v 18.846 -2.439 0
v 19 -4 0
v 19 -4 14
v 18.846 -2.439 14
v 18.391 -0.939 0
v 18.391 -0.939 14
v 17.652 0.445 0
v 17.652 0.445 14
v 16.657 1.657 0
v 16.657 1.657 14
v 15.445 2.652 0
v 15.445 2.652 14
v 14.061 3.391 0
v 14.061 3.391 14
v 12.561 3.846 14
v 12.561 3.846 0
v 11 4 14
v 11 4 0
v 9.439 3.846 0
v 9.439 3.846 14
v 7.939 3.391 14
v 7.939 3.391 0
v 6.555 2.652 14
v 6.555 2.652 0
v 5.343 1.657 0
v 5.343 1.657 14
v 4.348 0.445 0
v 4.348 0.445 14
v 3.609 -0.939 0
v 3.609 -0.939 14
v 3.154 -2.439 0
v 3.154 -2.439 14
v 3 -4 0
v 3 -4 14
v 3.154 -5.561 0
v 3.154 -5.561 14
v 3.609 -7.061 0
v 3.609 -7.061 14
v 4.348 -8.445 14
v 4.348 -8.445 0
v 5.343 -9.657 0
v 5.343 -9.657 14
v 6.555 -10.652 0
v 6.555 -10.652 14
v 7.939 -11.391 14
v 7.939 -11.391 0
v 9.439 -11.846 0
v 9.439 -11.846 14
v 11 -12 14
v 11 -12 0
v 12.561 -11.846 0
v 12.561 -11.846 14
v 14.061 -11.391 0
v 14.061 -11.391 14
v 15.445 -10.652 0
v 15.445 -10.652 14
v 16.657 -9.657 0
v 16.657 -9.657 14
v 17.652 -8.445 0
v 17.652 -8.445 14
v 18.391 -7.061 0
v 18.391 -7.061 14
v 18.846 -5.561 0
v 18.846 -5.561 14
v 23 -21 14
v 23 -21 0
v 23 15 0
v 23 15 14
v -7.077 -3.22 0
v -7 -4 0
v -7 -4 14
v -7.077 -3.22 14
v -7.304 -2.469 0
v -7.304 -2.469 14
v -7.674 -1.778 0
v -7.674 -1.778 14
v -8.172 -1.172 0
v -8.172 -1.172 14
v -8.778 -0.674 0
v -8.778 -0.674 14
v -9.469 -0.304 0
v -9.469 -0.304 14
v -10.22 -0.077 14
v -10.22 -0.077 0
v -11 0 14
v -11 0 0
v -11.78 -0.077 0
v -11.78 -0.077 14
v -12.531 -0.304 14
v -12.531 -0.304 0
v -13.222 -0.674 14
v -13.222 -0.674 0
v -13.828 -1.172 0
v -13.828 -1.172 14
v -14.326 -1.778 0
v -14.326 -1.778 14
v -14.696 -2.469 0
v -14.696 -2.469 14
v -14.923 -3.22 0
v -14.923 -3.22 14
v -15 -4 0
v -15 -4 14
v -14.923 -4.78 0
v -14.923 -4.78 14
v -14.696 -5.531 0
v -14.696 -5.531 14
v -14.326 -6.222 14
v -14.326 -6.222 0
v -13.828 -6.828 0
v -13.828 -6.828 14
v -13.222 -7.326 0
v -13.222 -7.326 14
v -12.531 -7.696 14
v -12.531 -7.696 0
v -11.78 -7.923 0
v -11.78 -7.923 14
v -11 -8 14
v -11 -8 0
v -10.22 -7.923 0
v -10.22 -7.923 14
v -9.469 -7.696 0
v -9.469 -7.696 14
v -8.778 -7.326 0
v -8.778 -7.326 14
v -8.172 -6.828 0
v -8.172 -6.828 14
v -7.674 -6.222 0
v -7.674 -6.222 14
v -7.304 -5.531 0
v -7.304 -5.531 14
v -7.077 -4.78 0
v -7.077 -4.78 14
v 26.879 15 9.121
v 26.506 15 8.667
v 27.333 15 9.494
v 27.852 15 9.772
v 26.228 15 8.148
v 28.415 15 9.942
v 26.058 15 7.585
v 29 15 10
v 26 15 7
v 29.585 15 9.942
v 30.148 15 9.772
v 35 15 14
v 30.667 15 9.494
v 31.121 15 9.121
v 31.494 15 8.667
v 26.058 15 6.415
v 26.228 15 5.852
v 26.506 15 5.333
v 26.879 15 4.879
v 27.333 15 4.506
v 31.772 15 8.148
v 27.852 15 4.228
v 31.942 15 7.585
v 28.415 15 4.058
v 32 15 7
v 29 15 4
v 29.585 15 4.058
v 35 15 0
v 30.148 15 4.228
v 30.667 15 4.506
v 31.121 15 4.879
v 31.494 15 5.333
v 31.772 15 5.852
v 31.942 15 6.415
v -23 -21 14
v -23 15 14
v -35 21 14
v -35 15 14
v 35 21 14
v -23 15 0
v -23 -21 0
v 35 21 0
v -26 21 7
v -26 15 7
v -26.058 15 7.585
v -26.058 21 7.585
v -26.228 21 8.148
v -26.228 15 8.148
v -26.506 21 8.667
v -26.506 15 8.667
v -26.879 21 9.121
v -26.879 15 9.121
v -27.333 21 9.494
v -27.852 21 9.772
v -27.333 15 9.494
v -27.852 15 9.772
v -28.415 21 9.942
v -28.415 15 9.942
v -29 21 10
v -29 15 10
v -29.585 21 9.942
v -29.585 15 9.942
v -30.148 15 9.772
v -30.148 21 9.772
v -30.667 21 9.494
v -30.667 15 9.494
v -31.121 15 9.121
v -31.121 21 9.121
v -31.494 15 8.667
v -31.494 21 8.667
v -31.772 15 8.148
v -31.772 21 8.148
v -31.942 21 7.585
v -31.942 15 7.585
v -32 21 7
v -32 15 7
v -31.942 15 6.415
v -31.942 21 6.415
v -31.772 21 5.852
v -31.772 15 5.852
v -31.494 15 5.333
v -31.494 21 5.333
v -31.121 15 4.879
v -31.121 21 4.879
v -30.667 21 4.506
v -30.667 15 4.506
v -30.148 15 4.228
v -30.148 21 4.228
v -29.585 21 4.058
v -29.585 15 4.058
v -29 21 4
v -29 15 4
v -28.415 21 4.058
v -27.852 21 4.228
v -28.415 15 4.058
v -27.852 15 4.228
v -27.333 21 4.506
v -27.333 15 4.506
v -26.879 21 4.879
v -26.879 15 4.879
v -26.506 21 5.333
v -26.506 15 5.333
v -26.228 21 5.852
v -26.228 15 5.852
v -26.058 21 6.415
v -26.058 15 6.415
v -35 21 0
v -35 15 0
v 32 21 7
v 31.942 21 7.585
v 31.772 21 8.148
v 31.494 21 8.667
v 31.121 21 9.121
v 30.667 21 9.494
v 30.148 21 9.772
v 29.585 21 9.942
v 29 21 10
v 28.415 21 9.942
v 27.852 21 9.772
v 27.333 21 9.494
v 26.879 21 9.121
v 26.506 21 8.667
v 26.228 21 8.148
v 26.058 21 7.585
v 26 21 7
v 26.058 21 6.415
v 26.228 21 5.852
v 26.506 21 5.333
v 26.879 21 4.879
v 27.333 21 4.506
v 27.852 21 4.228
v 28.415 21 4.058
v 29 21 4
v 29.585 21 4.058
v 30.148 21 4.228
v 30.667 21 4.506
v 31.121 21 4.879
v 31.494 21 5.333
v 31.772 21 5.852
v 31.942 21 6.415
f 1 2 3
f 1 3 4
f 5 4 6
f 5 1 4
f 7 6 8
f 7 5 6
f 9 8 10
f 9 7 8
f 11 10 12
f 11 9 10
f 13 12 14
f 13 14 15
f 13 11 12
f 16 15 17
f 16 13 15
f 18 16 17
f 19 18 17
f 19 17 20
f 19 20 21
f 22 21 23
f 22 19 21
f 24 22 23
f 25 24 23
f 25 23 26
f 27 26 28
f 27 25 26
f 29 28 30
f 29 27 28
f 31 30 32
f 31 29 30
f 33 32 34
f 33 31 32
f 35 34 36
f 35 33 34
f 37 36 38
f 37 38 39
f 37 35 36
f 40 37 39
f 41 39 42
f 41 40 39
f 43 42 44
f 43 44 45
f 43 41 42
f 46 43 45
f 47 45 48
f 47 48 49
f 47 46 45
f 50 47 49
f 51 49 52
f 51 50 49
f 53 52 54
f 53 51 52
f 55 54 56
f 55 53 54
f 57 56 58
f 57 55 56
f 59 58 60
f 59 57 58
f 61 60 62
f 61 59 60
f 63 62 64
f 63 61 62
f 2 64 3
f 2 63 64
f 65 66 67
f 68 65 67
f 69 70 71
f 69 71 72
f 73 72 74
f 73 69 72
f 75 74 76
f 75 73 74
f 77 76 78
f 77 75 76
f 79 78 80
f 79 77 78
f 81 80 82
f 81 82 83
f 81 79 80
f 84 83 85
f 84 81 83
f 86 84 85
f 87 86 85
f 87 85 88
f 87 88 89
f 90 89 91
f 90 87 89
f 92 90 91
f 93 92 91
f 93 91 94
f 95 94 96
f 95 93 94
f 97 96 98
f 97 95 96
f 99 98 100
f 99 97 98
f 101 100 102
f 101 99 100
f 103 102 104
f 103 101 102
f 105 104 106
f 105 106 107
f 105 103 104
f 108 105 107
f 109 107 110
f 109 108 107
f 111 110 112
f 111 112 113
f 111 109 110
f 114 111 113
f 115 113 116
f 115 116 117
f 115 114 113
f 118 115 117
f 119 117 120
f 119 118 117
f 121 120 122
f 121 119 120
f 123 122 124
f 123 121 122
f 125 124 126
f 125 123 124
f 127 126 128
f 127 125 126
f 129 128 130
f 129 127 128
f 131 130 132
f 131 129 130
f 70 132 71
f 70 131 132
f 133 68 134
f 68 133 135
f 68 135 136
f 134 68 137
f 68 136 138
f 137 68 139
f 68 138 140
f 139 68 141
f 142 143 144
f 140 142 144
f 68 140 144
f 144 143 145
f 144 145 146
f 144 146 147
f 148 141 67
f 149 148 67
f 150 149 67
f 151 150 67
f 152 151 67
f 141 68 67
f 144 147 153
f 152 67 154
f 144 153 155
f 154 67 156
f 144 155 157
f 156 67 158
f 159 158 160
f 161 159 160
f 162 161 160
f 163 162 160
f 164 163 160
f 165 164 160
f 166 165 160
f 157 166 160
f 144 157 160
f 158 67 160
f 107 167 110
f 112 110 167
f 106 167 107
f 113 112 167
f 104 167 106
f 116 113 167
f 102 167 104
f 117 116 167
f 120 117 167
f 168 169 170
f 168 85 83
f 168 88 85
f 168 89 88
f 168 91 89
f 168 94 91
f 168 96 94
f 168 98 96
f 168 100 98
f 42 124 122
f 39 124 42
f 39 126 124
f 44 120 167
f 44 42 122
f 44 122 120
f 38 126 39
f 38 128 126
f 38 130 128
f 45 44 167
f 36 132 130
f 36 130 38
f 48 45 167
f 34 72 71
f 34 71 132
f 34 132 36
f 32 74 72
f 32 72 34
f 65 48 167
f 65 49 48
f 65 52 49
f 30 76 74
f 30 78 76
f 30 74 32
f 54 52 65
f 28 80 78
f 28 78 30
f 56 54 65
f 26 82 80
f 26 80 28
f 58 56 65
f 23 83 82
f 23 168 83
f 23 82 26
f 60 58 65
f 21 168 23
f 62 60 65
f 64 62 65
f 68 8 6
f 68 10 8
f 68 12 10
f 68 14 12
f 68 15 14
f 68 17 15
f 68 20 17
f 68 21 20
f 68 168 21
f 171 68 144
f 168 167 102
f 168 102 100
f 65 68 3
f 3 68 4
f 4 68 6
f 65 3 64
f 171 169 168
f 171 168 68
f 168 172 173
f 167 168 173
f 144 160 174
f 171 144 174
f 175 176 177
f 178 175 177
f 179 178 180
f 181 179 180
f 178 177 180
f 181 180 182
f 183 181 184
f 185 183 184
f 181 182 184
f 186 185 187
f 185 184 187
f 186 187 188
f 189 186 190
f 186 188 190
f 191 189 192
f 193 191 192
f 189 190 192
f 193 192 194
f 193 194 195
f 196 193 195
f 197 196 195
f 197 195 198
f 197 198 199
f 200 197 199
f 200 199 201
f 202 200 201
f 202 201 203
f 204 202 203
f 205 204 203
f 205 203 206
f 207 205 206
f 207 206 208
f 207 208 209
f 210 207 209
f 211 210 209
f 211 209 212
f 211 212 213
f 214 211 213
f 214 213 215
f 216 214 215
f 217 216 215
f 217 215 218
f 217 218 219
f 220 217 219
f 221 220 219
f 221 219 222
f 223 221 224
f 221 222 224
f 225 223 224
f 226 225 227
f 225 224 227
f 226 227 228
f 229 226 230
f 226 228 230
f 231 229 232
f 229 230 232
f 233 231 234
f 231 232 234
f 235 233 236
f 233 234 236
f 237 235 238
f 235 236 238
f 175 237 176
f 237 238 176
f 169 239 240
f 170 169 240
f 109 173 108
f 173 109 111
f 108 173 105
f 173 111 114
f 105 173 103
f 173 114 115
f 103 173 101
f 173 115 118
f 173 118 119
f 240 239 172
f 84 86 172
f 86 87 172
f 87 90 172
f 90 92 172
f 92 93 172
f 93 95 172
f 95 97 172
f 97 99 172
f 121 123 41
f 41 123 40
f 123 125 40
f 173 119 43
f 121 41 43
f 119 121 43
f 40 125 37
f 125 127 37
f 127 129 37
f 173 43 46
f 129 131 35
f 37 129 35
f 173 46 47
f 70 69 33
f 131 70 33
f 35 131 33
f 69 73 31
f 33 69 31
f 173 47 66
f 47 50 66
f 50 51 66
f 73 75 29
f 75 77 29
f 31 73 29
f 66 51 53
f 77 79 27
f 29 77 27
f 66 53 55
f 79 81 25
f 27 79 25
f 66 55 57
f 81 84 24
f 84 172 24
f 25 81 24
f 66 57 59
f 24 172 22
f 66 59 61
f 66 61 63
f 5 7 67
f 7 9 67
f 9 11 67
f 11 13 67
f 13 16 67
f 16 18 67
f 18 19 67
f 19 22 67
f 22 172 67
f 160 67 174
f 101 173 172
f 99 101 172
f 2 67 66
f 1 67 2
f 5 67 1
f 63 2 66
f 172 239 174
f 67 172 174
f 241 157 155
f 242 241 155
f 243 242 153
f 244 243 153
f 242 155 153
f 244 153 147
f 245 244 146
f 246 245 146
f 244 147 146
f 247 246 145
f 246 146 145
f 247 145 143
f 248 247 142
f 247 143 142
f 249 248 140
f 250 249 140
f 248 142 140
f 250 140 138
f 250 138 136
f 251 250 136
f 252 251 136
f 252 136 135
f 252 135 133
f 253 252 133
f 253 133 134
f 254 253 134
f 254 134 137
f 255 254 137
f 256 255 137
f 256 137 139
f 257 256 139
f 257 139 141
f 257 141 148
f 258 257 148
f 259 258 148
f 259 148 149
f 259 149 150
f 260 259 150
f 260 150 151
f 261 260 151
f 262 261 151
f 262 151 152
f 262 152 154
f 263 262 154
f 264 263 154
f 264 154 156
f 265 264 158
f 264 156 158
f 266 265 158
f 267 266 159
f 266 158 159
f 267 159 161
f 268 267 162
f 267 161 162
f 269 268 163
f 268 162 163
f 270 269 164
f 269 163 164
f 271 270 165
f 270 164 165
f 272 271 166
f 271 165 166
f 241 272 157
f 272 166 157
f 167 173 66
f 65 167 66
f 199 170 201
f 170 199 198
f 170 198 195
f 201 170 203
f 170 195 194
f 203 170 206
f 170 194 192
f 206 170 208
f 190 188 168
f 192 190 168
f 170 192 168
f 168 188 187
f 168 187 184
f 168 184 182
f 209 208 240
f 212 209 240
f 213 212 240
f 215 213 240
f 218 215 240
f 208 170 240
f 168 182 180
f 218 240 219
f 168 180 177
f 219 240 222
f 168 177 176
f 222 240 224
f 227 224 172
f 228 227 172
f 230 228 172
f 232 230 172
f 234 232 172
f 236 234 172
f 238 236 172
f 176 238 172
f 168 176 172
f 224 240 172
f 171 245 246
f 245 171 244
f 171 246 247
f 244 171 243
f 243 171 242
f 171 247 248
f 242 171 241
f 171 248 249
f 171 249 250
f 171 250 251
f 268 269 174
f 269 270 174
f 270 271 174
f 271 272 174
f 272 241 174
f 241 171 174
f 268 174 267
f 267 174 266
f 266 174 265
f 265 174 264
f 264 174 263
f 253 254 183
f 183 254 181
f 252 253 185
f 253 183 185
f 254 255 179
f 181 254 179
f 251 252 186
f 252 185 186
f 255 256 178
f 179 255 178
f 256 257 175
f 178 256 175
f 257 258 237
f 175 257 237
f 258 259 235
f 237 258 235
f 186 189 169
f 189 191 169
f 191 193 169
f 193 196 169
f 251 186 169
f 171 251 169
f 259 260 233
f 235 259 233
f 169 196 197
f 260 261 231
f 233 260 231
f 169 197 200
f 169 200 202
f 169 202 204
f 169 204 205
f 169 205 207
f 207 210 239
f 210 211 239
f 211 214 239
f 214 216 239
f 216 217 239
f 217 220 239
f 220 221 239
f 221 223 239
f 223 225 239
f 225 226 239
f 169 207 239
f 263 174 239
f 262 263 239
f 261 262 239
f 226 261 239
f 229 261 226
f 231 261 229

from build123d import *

# Parameters (mm, degrees)
SKETCH_1_R          = 4
SKETCH_1_R_2        = 8
EXTRUDE_1_DEPTH     = 14
SKETCH_2_R          = 3
CUT_EXTRUDE_1_DEPTH = 14


with BuildPart() as part:
    # 草图1 → 凸台-拉伸1 (new body)
    with BuildSketch(Plane.XY):
        Polygon((-35, 21), (-35, 15), (-23, 15), (-23, -21), (23, -21), (23, 15), (35, 15), (35, 21), align=None)
        with Locations((-11, -4)):
            Circle(SKETCH_1_R, mode=Mode.SUBTRACT)
        with Locations((11, -4)):
            Circle(SKETCH_1_R_2, mode=Mode.SUBTRACT)
    extrude(amount=EXTRUDE_1_DEPTH)

    # 草图2 → 切除-拉伸1 (cut)
    with BuildSketch(Plane.XZ.offset(-15)):
        with Locations((-29, 7)):
            Circle(SKETCH_2_R)
        with Locations((29, 7)):
            Circle(SKETCH_2_R)
    extrude(amount=-CUT_EXTRUDE_1_DEPTH, mode=Mode.SUBTRACT)


solid = part.part
